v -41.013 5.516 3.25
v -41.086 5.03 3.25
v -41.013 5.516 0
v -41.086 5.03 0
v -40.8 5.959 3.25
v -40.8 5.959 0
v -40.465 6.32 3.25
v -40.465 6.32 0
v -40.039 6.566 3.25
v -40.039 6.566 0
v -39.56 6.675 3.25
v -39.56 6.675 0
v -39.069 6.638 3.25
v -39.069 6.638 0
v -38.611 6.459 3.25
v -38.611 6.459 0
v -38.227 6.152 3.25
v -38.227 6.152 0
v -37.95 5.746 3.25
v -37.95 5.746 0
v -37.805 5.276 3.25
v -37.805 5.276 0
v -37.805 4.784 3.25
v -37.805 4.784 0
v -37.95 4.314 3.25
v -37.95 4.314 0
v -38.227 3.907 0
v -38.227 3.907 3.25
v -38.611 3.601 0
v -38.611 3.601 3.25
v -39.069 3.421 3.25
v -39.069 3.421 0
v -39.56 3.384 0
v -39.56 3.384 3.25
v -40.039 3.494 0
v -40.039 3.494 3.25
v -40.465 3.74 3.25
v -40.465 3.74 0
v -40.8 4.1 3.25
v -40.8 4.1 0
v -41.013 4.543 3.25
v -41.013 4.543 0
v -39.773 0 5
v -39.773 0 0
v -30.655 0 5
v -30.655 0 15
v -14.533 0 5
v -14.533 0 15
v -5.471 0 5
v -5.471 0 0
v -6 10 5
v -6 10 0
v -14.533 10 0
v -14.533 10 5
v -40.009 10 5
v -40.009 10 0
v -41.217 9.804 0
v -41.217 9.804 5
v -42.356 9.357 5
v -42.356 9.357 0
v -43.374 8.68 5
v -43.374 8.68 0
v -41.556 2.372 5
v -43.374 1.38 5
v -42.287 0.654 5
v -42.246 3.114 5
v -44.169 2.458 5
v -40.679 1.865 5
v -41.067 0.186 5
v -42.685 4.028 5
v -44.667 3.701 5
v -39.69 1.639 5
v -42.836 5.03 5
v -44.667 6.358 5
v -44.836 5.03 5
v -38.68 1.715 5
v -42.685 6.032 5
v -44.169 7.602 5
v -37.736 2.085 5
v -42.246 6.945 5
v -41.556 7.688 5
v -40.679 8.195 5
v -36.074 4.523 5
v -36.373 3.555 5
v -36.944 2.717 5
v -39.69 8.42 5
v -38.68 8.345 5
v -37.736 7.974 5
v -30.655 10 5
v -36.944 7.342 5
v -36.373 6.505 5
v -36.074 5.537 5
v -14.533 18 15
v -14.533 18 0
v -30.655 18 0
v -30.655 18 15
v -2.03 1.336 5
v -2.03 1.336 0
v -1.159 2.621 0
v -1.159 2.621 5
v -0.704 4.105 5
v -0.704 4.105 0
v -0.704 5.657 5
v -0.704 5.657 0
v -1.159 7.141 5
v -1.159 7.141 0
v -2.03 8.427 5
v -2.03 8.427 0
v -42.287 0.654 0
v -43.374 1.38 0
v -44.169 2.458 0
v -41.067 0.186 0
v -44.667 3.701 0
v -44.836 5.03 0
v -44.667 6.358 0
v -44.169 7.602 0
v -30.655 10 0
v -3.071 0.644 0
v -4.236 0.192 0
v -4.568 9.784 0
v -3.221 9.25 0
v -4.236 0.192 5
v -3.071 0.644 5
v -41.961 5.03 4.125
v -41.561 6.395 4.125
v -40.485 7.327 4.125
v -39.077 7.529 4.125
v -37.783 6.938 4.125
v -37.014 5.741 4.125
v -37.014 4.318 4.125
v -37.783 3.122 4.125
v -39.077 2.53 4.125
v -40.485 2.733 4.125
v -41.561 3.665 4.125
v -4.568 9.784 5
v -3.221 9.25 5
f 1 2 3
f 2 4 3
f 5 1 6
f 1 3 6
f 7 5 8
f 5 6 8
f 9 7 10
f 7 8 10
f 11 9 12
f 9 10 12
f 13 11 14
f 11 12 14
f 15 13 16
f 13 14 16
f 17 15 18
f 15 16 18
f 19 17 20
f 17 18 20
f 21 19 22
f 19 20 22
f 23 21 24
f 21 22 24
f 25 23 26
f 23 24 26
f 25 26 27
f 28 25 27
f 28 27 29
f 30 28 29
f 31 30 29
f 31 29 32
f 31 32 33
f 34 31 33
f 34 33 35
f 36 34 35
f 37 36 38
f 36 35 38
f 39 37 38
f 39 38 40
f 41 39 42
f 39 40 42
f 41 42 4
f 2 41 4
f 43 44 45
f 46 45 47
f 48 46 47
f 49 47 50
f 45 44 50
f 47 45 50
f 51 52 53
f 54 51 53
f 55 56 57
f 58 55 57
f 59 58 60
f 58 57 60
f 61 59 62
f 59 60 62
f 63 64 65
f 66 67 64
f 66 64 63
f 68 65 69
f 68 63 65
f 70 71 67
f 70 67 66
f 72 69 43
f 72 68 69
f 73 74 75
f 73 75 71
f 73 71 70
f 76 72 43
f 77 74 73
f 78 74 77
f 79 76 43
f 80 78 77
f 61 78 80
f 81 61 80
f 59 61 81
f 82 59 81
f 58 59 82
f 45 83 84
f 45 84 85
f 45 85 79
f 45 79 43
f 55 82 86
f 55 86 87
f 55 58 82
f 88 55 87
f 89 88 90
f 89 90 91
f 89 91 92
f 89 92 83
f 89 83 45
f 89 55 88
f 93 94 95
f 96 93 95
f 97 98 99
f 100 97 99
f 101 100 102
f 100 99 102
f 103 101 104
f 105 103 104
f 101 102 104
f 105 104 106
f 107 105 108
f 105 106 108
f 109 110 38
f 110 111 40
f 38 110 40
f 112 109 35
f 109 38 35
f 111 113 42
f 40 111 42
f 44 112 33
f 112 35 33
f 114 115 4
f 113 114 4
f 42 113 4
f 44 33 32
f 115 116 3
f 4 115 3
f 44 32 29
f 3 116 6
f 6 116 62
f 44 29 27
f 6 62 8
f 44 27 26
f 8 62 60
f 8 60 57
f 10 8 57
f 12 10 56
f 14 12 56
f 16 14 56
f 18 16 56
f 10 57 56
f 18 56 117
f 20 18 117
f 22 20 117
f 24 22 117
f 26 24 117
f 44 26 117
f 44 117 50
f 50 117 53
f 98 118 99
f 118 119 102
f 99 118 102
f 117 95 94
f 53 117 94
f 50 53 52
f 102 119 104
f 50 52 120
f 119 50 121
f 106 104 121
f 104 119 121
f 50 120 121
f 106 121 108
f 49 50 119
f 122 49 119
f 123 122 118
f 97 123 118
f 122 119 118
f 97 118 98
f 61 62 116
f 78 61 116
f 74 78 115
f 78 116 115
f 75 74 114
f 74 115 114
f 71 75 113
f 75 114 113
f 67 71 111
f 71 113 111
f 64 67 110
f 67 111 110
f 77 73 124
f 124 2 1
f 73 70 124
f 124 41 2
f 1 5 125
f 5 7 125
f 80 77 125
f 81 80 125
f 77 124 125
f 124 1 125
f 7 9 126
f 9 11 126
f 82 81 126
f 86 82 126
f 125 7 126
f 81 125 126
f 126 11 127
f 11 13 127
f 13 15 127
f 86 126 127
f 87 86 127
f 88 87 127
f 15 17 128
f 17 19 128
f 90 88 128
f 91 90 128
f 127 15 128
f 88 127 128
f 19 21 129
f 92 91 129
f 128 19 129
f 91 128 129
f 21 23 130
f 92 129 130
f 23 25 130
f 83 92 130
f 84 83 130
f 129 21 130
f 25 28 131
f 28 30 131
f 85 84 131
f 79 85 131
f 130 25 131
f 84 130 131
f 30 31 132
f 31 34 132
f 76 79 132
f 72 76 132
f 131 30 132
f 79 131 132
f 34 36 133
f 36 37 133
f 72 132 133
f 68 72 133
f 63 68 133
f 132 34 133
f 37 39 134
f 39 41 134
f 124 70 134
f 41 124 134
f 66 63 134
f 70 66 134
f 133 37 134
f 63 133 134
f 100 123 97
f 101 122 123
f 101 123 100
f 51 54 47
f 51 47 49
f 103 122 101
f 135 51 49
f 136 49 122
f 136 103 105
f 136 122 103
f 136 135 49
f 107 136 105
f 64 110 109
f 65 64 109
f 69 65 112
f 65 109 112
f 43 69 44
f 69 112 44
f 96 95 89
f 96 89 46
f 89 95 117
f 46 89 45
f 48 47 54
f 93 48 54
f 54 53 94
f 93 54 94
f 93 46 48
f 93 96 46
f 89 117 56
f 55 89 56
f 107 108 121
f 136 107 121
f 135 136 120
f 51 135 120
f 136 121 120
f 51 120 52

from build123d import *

# Parameters (mm, degrees)
F0_R           = 1.7
F1_DEPTH       = 5
F2_DEPTH       = 15
F4_D           = 3.3
F4_CSINK_D     = 6.8
F4_CSINK_ANGLE = 90


with BuildPart() as f1:
    # F0 (on Top) → F1 (new body)
    with BuildSketch(Plane.XY):
        with BuildLine():
            Line((-39.4, 0), (-30.654659, 0))
            Line((-30.654659, 0), (-30.654659, 10))
            Line((-30.654659, 10), (-39.386656, 10))
            Line((-39.386656, 10), (-40.009414, 10))
            ThreePointArc((-40.009414, 10), (-41.798277, 9.611144), (-43.374257, 8.679732))
            ThreePointArc((-43.374257, 8.679732), (-44.836341, 5.029774), (-43.374257, 1.379816))
            ThreePointArc((-43.374257, 1.379816), (-41.689998, 0.386223), (-39.773025, 0))
            Line((-39.773025, 0), (-39.4, 0))
        make_face()
        with Locations((-39.4, 5)):
            Circle(F0_R, mode=Mode.SUBTRACT)
        Polygon((-30.654659, 0), (-14.532625, 0), (-14.532625, 10), (-14.532625, 18), (-30.654659, 18), (-30.654659, 10), align=None)
        with BuildLine():
            Line((-6, 0), (-5.471228, 0))
            ThreePointArc((-5.471228, 0), (-3.641152, 0.386148), (-2.029729, 1.335675))
            ThreePointArc((-2.029729, 1.335675), (-0.646469, 4.881091), (-2.029729, 8.426508))
            ThreePointArc((-2.029729, 8.426508), (-3.879298, 9.555319), (-6, 10))
            Line((-6, 10), (-14.532625, 10))
            Line((-14.532625, 10), (-14.532625, 0))
            Line((-14.532625, 0), (-6, 0))
        make_face()
        with Locations((-6, 5)):
            Circle(F0_R, mode=Mode.SUBTRACT)
        with Locations((-39.4, 5)):
            Circle(F0_R)
        with Locations((-6, 5)):
            Circle(F0_R)
    extrude(amount=F1_DEPTH)

    # F0 (on Top) → F2 (join)
    with BuildSketch(Plane.XY):
        Polygon((-30.654659, 0), (-14.532625, 0), (-14.532625, 10), (-14.532625, 18), (-30.654659, 18), (-30.654659, 10), align=None)
    extrude(amount=F2_DEPTH)

    # F4 (through all)
    with Locations(Plane.XY.offset(5)):
        with Locations((-39.436341, 5.029774)):
            CounterSinkHole(F4_D / 2, F4_CSINK_D / 2, counter_sink_angle=F4_CSINK_ANGLE)


solid = f1.part
